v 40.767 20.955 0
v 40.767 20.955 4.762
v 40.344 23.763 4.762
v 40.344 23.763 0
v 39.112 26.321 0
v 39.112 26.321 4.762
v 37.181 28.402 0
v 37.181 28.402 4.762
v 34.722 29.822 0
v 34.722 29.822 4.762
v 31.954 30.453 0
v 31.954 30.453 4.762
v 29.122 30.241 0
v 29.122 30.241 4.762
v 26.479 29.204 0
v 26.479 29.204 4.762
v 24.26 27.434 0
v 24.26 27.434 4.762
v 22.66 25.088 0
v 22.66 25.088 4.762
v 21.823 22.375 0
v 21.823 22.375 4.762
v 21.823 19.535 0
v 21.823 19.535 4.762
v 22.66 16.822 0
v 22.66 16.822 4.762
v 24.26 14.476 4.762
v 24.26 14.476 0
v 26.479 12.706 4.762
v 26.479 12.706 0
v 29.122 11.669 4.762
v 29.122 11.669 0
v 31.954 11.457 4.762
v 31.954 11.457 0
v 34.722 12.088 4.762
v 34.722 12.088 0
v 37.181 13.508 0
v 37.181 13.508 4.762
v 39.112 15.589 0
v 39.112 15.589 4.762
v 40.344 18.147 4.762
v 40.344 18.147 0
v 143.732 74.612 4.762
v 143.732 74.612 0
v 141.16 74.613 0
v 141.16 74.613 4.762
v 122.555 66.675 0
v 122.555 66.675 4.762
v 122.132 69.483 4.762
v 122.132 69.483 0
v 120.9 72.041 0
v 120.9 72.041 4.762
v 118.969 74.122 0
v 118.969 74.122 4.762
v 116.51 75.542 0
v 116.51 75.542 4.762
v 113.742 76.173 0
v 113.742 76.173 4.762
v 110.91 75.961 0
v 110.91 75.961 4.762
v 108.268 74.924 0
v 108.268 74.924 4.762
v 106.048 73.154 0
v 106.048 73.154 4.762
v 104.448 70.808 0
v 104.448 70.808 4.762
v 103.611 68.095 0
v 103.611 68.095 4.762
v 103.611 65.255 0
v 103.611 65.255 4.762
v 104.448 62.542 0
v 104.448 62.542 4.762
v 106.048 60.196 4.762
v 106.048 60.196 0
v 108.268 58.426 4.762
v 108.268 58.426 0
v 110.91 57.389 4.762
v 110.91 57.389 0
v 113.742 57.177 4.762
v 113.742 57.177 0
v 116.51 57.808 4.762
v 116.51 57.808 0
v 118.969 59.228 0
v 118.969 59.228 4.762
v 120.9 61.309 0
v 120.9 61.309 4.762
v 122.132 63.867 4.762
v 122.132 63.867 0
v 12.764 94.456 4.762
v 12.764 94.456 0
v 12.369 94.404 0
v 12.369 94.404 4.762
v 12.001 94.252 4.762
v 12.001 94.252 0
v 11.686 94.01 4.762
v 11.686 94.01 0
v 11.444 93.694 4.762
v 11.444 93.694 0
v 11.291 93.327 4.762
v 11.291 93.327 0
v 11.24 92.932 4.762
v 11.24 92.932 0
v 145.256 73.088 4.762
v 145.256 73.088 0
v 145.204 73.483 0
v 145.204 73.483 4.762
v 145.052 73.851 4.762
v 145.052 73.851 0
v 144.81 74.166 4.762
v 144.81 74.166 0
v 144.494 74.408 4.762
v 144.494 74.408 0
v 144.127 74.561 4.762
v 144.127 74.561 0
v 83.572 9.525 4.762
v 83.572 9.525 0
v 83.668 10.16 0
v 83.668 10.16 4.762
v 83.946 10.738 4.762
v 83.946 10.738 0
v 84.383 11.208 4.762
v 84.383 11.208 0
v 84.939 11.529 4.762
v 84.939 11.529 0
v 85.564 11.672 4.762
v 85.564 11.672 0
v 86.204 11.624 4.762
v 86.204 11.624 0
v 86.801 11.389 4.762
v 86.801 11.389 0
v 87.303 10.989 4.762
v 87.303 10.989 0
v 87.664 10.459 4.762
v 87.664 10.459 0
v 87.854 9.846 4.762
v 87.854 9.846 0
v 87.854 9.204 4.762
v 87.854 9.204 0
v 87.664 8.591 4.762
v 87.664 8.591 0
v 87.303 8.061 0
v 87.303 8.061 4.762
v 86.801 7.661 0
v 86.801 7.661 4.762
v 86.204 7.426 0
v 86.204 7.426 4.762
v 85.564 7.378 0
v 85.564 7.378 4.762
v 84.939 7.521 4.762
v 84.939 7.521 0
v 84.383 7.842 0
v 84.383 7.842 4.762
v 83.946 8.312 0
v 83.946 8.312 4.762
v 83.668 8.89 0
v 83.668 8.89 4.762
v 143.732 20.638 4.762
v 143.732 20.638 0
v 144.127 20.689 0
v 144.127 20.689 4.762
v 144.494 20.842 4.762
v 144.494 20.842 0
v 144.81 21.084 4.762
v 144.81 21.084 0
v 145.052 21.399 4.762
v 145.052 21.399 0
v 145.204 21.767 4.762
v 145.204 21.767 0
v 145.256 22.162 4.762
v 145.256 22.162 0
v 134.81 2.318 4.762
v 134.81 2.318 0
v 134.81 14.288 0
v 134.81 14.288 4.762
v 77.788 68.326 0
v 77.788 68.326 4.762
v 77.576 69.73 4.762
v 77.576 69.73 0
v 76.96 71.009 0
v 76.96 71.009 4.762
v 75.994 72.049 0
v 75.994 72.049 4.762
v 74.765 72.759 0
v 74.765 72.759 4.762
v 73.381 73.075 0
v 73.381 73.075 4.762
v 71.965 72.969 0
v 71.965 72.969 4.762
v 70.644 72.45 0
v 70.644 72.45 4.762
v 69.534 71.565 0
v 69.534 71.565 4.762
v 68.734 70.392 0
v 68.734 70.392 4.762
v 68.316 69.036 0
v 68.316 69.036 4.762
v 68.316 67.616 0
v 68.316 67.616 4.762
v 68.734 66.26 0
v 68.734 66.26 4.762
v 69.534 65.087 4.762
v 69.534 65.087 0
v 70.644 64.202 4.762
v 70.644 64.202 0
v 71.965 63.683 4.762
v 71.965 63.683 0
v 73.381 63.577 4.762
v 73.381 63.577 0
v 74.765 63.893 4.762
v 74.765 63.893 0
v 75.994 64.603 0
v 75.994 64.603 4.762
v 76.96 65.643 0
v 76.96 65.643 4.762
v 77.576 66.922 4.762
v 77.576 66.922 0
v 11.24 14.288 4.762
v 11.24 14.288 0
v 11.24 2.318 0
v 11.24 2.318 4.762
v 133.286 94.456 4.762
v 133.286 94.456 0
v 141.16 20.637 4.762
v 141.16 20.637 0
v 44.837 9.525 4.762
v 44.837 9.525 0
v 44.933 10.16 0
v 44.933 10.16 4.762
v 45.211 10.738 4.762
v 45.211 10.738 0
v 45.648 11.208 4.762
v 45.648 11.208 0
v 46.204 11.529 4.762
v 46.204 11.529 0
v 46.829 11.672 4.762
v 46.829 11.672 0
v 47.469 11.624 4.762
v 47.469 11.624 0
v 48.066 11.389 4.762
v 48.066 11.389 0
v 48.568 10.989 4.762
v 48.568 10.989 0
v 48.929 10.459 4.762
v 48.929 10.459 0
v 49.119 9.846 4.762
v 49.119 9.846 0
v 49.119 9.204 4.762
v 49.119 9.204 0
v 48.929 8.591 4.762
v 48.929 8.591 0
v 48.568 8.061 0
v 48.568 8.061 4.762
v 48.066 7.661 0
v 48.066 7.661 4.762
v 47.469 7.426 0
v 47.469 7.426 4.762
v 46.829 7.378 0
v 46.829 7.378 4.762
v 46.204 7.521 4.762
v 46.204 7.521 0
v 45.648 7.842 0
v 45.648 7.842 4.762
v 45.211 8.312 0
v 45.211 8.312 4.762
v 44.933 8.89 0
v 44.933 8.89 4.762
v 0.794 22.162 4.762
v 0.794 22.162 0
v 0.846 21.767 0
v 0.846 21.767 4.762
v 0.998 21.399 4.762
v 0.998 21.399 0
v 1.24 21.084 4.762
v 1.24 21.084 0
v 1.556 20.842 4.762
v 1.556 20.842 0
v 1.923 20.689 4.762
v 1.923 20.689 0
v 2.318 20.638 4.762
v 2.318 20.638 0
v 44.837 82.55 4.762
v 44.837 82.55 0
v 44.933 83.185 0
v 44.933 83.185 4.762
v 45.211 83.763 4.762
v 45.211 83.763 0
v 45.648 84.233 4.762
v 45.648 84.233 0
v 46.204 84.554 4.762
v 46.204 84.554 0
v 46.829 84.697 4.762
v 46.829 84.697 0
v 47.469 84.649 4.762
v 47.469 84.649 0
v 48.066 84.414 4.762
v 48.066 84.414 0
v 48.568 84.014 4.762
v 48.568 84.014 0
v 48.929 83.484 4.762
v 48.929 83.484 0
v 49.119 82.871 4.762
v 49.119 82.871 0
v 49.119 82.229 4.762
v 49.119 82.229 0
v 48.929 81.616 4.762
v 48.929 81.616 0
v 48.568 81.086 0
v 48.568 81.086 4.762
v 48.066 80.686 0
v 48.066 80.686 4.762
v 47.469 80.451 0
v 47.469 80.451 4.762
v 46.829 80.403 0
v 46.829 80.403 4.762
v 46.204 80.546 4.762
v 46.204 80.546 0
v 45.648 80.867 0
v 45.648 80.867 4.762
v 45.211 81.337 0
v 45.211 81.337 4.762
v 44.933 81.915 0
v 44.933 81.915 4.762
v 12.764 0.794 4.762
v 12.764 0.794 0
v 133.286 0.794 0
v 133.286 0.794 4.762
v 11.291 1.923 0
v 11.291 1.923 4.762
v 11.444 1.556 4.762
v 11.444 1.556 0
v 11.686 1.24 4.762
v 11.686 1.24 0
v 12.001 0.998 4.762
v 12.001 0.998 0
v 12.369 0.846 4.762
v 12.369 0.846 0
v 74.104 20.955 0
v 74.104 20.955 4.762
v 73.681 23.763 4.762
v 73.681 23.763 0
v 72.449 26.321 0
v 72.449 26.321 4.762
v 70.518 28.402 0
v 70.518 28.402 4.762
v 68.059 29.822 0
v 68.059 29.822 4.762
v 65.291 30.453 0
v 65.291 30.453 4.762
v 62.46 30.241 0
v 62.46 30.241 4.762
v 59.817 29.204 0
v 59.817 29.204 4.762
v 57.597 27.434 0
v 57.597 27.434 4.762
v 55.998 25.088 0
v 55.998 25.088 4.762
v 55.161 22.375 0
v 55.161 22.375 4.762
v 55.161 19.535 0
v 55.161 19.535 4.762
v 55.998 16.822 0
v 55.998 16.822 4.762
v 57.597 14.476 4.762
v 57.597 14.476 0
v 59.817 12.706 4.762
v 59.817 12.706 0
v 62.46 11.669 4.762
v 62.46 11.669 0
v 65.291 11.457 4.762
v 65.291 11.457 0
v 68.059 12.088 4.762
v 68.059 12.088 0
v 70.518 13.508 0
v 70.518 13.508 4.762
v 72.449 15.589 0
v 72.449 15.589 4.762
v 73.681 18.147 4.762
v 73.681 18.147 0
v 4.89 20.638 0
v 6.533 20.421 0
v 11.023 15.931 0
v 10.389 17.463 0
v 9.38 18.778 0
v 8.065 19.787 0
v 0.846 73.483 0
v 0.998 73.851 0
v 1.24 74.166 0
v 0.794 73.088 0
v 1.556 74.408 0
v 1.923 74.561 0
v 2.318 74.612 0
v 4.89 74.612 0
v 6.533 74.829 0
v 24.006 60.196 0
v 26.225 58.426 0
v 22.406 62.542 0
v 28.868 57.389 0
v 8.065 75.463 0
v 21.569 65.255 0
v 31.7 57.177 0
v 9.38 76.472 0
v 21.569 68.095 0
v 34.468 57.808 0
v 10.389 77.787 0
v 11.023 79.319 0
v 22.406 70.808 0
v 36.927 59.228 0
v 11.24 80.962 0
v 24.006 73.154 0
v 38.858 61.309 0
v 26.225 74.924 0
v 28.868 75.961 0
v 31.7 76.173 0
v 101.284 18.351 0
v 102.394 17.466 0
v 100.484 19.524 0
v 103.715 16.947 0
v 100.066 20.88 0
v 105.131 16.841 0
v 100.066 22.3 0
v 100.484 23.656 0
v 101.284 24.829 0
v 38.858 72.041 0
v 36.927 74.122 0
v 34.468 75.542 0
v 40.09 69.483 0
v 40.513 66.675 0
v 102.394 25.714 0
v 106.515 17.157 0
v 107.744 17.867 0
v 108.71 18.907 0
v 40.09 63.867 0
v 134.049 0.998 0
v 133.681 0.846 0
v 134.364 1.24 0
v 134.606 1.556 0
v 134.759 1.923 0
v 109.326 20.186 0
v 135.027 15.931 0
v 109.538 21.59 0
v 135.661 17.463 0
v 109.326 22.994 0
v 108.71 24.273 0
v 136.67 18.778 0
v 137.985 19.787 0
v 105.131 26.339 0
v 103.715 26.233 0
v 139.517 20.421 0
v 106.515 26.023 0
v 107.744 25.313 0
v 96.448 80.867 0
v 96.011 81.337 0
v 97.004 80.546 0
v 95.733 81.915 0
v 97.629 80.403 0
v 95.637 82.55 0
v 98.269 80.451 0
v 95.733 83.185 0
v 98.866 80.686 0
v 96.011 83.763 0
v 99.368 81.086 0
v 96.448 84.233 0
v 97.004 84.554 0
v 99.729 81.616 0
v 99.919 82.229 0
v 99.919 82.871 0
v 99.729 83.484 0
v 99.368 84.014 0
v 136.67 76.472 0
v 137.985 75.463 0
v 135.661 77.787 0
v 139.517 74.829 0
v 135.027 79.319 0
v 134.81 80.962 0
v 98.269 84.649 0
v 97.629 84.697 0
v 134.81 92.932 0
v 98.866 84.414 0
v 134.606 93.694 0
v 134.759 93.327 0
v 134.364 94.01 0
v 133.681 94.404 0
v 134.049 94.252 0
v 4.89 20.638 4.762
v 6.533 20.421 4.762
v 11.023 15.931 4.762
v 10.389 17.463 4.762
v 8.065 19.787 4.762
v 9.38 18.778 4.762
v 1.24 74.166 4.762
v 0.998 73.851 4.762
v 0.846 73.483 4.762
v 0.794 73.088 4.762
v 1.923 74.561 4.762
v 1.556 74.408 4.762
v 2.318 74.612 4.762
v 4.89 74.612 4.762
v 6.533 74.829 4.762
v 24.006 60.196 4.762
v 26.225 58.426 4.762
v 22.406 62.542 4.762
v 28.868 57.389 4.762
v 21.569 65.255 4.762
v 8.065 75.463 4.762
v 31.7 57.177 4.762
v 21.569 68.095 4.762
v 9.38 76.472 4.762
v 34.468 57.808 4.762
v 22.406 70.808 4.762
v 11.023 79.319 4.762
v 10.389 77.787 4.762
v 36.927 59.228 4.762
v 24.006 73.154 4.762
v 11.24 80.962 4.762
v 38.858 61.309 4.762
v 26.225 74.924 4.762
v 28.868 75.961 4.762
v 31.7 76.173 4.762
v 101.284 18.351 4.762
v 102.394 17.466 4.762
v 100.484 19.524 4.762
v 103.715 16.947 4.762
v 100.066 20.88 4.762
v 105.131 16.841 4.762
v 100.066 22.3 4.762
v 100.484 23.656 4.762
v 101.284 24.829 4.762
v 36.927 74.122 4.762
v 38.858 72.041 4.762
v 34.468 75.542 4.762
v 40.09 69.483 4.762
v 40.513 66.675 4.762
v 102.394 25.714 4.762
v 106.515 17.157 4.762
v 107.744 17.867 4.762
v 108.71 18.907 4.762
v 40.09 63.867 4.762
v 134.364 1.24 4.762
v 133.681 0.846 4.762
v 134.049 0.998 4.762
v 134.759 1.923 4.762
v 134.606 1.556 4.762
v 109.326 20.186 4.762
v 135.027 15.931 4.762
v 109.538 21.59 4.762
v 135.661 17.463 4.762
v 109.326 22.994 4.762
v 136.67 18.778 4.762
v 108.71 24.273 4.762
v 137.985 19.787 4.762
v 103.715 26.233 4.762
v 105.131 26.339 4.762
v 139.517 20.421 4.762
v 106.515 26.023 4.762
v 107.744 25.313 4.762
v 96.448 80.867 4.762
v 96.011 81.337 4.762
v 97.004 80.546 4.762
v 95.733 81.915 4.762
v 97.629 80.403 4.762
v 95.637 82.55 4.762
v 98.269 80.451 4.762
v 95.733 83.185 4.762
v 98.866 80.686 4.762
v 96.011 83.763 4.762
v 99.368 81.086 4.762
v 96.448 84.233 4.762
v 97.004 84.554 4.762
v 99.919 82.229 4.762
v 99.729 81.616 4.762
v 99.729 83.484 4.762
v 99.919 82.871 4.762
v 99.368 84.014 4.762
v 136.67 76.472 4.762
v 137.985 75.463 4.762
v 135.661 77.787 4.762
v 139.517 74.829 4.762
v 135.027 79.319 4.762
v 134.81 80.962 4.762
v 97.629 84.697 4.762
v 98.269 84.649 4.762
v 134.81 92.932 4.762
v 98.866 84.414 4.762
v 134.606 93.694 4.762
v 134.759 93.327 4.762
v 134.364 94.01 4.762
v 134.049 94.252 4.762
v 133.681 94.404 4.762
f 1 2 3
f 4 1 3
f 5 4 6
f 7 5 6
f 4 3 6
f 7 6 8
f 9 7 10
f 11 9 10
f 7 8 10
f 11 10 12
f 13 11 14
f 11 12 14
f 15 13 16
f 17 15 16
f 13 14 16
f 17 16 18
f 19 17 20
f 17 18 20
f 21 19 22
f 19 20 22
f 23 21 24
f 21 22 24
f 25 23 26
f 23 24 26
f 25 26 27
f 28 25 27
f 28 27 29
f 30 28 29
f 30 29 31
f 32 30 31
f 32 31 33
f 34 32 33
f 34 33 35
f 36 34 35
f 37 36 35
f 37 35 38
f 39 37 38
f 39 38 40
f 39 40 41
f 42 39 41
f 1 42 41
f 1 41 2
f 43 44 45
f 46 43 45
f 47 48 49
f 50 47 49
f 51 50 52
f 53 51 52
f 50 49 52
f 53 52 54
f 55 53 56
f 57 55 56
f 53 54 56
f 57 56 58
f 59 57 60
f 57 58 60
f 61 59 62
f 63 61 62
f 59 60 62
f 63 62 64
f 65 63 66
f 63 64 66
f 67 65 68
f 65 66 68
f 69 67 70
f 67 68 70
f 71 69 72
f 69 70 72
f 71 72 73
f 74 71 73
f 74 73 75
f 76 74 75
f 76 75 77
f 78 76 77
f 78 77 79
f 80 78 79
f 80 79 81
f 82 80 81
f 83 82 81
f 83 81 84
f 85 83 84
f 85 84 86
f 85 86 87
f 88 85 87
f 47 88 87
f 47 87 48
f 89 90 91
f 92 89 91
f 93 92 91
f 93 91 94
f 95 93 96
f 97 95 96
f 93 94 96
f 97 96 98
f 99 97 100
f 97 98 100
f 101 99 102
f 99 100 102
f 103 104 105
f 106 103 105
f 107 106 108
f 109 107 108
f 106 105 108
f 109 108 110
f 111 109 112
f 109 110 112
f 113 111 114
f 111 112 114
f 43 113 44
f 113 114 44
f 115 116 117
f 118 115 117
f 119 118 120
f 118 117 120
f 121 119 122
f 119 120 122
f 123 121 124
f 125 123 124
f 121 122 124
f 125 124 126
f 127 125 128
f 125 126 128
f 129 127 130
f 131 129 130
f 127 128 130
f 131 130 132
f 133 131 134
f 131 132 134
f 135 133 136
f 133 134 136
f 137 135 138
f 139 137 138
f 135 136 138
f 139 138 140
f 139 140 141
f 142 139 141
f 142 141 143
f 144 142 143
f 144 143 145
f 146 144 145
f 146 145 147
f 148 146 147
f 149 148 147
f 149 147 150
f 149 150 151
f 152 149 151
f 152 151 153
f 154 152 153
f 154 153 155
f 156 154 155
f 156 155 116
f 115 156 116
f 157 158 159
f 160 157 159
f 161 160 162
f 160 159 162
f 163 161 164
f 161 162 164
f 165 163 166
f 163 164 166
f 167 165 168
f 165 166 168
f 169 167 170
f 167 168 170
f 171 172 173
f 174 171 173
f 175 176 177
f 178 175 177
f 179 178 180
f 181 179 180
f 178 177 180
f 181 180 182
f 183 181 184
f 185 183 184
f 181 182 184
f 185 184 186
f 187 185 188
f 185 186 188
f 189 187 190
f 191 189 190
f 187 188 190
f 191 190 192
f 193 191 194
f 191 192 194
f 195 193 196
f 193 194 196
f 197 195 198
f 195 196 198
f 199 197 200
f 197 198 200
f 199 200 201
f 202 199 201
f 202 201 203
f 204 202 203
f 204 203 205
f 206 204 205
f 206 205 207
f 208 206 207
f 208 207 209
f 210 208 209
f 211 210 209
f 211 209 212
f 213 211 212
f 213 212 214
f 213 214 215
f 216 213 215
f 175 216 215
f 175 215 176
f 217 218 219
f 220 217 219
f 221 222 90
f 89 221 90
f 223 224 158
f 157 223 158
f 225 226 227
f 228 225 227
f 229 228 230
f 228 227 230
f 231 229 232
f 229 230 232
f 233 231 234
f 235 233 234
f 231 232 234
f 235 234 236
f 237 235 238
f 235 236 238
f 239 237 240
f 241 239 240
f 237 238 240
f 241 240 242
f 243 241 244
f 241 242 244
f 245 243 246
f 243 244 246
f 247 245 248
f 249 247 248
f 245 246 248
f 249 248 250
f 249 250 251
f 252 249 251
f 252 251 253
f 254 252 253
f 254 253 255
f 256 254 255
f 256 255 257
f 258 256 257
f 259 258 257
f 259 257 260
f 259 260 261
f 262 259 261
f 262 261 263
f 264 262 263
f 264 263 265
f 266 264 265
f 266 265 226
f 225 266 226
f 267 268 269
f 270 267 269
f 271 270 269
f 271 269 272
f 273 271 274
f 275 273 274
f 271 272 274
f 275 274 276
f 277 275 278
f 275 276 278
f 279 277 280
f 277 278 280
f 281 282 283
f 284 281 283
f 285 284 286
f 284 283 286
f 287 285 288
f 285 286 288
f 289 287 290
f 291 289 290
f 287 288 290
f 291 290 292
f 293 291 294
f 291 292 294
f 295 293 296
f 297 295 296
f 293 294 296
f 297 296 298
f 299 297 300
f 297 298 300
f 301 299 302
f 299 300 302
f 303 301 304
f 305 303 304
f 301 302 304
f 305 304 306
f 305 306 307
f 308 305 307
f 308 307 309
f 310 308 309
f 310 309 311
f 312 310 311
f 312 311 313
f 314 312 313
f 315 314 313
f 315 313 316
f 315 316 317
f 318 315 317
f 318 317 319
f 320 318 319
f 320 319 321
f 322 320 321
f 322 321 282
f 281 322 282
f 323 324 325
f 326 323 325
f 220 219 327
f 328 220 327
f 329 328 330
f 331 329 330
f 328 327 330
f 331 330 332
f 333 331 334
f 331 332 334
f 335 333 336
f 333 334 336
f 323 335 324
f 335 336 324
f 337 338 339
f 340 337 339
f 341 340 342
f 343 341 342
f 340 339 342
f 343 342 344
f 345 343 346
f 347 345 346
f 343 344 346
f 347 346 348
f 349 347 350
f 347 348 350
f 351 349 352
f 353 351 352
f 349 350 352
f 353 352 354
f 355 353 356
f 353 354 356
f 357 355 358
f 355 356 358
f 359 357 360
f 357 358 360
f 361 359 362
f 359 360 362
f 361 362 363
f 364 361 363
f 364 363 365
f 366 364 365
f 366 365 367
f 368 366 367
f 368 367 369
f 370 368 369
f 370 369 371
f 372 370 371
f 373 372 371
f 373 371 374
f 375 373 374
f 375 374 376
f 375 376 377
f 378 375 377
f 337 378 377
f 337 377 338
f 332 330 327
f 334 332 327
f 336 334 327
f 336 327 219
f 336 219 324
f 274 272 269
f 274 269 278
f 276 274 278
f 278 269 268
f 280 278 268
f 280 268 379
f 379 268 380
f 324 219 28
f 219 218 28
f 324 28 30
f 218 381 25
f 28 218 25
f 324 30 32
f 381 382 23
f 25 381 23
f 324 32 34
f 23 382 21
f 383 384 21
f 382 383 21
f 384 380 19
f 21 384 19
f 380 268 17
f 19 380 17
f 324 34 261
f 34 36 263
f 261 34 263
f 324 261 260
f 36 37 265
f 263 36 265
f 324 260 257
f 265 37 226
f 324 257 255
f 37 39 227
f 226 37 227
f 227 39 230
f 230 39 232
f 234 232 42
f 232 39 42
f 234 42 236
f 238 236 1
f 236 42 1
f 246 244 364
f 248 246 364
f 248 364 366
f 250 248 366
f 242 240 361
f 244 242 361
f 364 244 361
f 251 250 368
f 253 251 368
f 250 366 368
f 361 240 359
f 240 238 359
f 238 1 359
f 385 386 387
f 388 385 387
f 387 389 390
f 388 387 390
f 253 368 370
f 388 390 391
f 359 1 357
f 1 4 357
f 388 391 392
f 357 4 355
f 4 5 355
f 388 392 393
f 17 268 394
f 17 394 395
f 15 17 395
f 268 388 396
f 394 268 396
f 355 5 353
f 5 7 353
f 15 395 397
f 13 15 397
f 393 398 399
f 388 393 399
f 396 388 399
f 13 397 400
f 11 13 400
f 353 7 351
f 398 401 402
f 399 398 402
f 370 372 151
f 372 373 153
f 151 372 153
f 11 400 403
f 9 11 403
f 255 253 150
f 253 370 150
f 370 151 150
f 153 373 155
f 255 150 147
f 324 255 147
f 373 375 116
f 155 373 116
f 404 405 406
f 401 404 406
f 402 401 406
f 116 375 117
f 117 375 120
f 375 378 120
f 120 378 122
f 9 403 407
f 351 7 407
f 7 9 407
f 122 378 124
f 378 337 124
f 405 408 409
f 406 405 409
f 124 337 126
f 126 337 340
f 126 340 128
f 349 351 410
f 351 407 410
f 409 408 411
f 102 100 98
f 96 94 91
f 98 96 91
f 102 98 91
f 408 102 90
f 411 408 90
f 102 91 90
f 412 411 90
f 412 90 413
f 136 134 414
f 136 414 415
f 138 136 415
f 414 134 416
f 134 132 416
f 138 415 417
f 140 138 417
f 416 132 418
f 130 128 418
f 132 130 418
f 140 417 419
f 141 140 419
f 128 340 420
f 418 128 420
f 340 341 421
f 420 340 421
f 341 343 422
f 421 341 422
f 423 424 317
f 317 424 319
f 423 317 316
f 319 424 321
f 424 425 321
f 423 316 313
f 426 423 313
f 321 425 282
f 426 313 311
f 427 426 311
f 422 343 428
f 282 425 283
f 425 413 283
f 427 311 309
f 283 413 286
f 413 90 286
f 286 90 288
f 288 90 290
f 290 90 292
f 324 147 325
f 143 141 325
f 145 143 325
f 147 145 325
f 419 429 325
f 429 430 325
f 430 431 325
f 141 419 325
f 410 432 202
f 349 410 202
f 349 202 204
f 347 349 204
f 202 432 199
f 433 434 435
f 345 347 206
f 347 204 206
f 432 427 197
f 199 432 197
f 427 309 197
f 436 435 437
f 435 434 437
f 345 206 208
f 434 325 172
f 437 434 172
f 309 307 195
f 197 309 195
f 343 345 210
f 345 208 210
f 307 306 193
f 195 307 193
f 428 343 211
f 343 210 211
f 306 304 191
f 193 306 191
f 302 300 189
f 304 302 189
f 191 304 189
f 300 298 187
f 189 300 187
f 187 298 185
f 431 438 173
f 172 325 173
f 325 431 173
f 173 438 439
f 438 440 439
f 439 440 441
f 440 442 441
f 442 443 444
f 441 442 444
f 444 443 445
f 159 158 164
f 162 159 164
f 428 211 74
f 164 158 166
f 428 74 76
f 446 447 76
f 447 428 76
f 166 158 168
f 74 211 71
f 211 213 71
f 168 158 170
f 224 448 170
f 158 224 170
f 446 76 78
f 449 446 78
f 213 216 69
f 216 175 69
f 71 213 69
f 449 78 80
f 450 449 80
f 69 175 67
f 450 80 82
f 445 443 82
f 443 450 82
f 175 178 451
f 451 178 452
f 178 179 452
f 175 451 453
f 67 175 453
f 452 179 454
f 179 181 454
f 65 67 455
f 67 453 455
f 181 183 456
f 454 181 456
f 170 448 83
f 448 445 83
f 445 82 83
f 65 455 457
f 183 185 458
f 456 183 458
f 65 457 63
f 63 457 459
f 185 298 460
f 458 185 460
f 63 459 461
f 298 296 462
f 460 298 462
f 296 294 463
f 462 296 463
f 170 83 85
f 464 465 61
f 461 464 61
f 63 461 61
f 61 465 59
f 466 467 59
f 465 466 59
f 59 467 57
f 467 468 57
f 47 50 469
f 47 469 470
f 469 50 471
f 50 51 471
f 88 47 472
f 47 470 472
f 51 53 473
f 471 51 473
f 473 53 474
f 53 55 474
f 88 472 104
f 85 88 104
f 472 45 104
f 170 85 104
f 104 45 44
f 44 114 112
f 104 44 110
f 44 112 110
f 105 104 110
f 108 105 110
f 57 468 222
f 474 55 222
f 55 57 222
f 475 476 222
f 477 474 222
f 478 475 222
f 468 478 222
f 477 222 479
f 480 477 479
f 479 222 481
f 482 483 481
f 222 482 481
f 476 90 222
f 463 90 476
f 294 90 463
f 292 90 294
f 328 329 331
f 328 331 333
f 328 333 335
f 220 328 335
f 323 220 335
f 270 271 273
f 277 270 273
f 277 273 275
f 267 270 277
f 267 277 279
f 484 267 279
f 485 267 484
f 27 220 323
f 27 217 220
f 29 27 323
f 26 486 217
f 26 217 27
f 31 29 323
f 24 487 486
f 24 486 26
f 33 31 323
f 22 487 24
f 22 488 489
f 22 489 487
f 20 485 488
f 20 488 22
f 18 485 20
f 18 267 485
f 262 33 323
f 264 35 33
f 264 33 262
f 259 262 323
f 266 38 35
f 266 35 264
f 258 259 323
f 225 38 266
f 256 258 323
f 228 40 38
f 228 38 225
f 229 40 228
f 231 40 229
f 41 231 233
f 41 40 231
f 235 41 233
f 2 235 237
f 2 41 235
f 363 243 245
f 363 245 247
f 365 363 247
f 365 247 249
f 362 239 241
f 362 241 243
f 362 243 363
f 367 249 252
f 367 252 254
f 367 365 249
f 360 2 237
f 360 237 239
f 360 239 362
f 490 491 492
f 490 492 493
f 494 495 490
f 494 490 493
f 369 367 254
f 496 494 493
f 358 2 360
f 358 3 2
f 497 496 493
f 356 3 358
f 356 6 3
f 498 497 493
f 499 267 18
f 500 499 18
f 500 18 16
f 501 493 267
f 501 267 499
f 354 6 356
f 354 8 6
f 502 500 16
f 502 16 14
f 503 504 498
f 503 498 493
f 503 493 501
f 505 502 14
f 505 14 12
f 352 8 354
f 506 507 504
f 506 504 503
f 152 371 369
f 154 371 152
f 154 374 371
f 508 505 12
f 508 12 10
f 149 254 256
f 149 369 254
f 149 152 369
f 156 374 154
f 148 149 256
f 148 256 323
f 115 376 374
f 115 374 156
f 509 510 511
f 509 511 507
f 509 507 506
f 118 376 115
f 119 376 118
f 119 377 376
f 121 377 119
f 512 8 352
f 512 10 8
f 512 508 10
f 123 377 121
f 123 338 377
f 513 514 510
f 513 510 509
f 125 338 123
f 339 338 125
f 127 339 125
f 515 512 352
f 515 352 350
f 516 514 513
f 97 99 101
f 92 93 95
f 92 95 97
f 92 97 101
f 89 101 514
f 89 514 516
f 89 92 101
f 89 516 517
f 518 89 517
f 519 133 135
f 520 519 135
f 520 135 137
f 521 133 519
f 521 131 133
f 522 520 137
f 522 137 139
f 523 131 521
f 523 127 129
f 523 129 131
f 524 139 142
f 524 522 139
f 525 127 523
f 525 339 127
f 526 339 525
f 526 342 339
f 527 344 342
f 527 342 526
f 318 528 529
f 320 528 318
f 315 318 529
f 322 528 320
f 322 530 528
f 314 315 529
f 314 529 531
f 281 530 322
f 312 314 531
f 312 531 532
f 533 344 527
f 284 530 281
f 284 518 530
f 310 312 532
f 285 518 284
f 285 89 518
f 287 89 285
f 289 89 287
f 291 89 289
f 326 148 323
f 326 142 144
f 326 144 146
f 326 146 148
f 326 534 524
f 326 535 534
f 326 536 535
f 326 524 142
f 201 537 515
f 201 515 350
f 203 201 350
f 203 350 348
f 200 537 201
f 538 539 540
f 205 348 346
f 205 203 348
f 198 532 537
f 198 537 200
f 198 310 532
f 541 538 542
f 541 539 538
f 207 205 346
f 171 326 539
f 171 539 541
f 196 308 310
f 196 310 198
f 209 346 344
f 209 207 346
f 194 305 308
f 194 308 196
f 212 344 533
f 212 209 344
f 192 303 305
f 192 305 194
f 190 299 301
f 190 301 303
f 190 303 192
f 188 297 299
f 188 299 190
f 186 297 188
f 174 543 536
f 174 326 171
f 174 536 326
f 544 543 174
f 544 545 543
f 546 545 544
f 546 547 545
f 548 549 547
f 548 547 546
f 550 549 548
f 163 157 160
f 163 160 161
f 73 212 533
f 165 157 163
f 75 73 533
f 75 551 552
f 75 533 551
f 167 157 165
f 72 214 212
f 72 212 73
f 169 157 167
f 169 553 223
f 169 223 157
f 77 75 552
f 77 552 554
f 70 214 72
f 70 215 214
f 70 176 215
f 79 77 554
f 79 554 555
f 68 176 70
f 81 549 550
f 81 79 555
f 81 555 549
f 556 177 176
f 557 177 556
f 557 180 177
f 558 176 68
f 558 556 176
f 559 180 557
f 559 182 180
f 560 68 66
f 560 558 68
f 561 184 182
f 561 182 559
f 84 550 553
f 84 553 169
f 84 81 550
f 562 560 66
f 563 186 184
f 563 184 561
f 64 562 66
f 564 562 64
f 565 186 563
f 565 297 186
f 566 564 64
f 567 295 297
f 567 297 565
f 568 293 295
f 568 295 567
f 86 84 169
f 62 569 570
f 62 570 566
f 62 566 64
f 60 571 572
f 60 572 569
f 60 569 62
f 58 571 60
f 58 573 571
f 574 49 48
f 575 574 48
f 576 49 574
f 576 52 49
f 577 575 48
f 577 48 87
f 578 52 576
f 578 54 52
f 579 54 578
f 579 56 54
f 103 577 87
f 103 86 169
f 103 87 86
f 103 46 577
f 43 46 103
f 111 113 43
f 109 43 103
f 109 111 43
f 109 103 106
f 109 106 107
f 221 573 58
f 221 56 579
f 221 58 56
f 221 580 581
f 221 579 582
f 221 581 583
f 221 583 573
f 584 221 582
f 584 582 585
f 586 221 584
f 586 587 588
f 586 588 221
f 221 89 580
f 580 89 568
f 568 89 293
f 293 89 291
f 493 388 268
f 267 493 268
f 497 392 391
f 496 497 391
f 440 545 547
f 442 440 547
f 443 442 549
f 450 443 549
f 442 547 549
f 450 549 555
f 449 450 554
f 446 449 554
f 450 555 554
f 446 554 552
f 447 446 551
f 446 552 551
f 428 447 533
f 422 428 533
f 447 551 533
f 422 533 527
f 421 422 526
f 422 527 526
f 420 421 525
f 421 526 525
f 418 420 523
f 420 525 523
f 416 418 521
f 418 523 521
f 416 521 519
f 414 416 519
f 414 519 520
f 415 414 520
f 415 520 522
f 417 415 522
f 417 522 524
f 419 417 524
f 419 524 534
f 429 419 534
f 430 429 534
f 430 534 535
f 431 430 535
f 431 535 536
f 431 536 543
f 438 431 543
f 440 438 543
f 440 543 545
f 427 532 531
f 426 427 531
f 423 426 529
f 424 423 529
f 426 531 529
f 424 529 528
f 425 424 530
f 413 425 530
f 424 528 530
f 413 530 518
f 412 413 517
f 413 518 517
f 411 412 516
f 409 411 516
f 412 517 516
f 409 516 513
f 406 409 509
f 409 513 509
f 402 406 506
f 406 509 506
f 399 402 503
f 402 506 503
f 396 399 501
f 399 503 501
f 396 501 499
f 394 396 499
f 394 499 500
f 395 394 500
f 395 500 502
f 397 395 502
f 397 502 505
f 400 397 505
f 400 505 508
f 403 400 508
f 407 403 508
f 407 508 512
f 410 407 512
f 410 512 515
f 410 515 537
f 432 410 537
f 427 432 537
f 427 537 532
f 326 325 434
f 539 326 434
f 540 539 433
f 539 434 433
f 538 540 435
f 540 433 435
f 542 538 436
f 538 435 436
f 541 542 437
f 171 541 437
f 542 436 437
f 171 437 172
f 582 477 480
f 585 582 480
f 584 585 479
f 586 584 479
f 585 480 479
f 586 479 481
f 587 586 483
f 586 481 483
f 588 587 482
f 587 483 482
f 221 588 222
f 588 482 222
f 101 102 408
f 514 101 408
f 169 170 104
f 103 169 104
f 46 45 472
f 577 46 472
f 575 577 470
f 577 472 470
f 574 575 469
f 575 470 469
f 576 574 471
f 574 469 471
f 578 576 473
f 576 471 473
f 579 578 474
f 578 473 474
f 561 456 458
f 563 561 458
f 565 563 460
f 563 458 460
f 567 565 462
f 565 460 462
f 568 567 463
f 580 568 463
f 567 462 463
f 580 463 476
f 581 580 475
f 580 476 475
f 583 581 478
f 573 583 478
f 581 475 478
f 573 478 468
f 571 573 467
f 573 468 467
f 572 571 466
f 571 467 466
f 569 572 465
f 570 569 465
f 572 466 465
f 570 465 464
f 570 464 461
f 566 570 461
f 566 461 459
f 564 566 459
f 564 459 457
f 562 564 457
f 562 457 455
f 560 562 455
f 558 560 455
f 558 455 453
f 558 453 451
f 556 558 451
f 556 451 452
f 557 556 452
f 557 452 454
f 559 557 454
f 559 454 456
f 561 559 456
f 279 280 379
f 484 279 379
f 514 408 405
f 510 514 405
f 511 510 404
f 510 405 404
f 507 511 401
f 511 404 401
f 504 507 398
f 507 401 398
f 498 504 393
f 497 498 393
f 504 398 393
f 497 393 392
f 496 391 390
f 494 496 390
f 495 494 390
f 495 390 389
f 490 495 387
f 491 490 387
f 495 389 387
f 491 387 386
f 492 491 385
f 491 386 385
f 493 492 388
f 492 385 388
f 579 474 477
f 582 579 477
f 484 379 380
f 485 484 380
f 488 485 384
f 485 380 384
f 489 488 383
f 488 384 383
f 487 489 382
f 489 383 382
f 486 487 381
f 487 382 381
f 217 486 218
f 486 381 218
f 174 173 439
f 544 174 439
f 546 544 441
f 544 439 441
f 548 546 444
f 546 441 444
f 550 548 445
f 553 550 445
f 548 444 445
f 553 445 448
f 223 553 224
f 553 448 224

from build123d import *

# Parameters (mm, degrees)
BOSS_EXTRUDE1_DEPTH   = 4.7625
F_6_CLEARANCE_HOLE1_D = 4.3053
SKETCH4_R             = 4.7625
SKETCH4_R_2           = 9.525
CUT_EXTRUDE1_DEPTH    = 5.7625


with BuildPart() as part:
    # Sketch1 → Boss-Extrude1 (new body)
    with BuildSketch(Plane.XY):
        with BuildLine():
            Line((133.2865, 94.45625), (12.7635, 94.45625))
            ThreePointArc((12.7635, 94.45625), (11.685869265, 94.009880735), (11.2395, 92.93225))
            Line((11.2395, 92.93225), (11.2395, 80.9625))
            ThreePointArc((11.2395, 80.9625), (9.379628061, 76.472371939), (4.8895, 74.6125))
            Line((4.8895, 74.6125), (2.31775, 74.6125))
            ThreePointArc((2.31775, 74.6125), (1.240119265, 74.166130735), (0.79375, 73.0885))
            Line((0.79375, 73.0885), (0.79375, 22.1615))
            ThreePointArc((0.79375, 22.1615), (1.240119265, 21.083869265), (2.31775, 20.6375))
            Line((2.31775, 20.6375), (4.8895, 20.6375))
            ThreePointArc((4.8895, 20.6375), (9.379628061, 18.777628061), (11.2395, 14.2875))
            Line((11.2395, 14.2875), (11.2395, 2.31775))
            ThreePointArc((11.2395, 2.31775), (11.685869265, 1.240119265), (12.7635, 0.79375))
            Line((12.7635, 0.79375), (133.2865, 0.79375))
            ThreePointArc((133.2865, 0.79375), (134.364130735, 1.240119265), (134.8105, 2.31775))
            Line((134.8105, 2.31775), (134.8105, 14.2875))
            ThreePointArc((134.8105, 14.2875), (136.670371939, 18.777628061), (141.1605, 20.6375))
            Line((141.1605, 20.6375), (143.73225, 20.6375))
            ThreePointArc((143.73225, 20.6375), (144.809880735, 21.083869265), (145.25625, 22.1615))
            Line((145.25625, 22.1615), (145.25625, 73.0885))
            ThreePointArc((145.25625, 73.0885), (144.809880735, 74.166130735), (143.73225, 74.6125))
            Line((143.73225, 74.6125), (141.1605, 74.6125))
            ThreePointArc((141.1605, 74.6125), (136.670371939, 76.472371939), (134.8105, 80.9625))
            Line((134.8105, 80.9625), (134.8105, 92.93225))
            ThreePointArc((134.8105, 92.93225), (134.364130735, 94.009880735), (133.2865, 94.45625))
        make_face()
    extrude(amount=BOSS_EXTRUDE1_DEPTH)

    # #6 Clearance Hole1 (through all)
    with Locations(Plane.XY.offset(4.7625)):
        with Locations((46.99, 82.55), (97.79, 82.55), (85.725, 9.525), (46.99, 9.525)):
            Hole(F_6_CLEARANCE_HOLE1_D / 2)

    # Sketch4 → Cut-Extrude1 (cut, through all)
    with BuildSketch(Plane.XY.offset(4.7625)):
        with Locations((73.025, 68.326)):
            Circle(SKETCH4_R)
        with Locations((104.775, 21.59)):
            Circle(SKETCH4_R)
        with Locations((30.988, 66.675)):
            Circle(SKETCH4_R_2)
        with Locations((113.03, 66.675)):
            Circle(SKETCH4_R_2)
        with Locations((31.242, 20.955)):
            Circle(SKETCH4_R_2)
        with Locations((64.5795, 20.955)):
            Circle(SKETCH4_R_2)
    extrude(amount=-CUT_EXTRUDE1_DEPTH, mode=Mode.SUBTRACT)


solid = part.part
